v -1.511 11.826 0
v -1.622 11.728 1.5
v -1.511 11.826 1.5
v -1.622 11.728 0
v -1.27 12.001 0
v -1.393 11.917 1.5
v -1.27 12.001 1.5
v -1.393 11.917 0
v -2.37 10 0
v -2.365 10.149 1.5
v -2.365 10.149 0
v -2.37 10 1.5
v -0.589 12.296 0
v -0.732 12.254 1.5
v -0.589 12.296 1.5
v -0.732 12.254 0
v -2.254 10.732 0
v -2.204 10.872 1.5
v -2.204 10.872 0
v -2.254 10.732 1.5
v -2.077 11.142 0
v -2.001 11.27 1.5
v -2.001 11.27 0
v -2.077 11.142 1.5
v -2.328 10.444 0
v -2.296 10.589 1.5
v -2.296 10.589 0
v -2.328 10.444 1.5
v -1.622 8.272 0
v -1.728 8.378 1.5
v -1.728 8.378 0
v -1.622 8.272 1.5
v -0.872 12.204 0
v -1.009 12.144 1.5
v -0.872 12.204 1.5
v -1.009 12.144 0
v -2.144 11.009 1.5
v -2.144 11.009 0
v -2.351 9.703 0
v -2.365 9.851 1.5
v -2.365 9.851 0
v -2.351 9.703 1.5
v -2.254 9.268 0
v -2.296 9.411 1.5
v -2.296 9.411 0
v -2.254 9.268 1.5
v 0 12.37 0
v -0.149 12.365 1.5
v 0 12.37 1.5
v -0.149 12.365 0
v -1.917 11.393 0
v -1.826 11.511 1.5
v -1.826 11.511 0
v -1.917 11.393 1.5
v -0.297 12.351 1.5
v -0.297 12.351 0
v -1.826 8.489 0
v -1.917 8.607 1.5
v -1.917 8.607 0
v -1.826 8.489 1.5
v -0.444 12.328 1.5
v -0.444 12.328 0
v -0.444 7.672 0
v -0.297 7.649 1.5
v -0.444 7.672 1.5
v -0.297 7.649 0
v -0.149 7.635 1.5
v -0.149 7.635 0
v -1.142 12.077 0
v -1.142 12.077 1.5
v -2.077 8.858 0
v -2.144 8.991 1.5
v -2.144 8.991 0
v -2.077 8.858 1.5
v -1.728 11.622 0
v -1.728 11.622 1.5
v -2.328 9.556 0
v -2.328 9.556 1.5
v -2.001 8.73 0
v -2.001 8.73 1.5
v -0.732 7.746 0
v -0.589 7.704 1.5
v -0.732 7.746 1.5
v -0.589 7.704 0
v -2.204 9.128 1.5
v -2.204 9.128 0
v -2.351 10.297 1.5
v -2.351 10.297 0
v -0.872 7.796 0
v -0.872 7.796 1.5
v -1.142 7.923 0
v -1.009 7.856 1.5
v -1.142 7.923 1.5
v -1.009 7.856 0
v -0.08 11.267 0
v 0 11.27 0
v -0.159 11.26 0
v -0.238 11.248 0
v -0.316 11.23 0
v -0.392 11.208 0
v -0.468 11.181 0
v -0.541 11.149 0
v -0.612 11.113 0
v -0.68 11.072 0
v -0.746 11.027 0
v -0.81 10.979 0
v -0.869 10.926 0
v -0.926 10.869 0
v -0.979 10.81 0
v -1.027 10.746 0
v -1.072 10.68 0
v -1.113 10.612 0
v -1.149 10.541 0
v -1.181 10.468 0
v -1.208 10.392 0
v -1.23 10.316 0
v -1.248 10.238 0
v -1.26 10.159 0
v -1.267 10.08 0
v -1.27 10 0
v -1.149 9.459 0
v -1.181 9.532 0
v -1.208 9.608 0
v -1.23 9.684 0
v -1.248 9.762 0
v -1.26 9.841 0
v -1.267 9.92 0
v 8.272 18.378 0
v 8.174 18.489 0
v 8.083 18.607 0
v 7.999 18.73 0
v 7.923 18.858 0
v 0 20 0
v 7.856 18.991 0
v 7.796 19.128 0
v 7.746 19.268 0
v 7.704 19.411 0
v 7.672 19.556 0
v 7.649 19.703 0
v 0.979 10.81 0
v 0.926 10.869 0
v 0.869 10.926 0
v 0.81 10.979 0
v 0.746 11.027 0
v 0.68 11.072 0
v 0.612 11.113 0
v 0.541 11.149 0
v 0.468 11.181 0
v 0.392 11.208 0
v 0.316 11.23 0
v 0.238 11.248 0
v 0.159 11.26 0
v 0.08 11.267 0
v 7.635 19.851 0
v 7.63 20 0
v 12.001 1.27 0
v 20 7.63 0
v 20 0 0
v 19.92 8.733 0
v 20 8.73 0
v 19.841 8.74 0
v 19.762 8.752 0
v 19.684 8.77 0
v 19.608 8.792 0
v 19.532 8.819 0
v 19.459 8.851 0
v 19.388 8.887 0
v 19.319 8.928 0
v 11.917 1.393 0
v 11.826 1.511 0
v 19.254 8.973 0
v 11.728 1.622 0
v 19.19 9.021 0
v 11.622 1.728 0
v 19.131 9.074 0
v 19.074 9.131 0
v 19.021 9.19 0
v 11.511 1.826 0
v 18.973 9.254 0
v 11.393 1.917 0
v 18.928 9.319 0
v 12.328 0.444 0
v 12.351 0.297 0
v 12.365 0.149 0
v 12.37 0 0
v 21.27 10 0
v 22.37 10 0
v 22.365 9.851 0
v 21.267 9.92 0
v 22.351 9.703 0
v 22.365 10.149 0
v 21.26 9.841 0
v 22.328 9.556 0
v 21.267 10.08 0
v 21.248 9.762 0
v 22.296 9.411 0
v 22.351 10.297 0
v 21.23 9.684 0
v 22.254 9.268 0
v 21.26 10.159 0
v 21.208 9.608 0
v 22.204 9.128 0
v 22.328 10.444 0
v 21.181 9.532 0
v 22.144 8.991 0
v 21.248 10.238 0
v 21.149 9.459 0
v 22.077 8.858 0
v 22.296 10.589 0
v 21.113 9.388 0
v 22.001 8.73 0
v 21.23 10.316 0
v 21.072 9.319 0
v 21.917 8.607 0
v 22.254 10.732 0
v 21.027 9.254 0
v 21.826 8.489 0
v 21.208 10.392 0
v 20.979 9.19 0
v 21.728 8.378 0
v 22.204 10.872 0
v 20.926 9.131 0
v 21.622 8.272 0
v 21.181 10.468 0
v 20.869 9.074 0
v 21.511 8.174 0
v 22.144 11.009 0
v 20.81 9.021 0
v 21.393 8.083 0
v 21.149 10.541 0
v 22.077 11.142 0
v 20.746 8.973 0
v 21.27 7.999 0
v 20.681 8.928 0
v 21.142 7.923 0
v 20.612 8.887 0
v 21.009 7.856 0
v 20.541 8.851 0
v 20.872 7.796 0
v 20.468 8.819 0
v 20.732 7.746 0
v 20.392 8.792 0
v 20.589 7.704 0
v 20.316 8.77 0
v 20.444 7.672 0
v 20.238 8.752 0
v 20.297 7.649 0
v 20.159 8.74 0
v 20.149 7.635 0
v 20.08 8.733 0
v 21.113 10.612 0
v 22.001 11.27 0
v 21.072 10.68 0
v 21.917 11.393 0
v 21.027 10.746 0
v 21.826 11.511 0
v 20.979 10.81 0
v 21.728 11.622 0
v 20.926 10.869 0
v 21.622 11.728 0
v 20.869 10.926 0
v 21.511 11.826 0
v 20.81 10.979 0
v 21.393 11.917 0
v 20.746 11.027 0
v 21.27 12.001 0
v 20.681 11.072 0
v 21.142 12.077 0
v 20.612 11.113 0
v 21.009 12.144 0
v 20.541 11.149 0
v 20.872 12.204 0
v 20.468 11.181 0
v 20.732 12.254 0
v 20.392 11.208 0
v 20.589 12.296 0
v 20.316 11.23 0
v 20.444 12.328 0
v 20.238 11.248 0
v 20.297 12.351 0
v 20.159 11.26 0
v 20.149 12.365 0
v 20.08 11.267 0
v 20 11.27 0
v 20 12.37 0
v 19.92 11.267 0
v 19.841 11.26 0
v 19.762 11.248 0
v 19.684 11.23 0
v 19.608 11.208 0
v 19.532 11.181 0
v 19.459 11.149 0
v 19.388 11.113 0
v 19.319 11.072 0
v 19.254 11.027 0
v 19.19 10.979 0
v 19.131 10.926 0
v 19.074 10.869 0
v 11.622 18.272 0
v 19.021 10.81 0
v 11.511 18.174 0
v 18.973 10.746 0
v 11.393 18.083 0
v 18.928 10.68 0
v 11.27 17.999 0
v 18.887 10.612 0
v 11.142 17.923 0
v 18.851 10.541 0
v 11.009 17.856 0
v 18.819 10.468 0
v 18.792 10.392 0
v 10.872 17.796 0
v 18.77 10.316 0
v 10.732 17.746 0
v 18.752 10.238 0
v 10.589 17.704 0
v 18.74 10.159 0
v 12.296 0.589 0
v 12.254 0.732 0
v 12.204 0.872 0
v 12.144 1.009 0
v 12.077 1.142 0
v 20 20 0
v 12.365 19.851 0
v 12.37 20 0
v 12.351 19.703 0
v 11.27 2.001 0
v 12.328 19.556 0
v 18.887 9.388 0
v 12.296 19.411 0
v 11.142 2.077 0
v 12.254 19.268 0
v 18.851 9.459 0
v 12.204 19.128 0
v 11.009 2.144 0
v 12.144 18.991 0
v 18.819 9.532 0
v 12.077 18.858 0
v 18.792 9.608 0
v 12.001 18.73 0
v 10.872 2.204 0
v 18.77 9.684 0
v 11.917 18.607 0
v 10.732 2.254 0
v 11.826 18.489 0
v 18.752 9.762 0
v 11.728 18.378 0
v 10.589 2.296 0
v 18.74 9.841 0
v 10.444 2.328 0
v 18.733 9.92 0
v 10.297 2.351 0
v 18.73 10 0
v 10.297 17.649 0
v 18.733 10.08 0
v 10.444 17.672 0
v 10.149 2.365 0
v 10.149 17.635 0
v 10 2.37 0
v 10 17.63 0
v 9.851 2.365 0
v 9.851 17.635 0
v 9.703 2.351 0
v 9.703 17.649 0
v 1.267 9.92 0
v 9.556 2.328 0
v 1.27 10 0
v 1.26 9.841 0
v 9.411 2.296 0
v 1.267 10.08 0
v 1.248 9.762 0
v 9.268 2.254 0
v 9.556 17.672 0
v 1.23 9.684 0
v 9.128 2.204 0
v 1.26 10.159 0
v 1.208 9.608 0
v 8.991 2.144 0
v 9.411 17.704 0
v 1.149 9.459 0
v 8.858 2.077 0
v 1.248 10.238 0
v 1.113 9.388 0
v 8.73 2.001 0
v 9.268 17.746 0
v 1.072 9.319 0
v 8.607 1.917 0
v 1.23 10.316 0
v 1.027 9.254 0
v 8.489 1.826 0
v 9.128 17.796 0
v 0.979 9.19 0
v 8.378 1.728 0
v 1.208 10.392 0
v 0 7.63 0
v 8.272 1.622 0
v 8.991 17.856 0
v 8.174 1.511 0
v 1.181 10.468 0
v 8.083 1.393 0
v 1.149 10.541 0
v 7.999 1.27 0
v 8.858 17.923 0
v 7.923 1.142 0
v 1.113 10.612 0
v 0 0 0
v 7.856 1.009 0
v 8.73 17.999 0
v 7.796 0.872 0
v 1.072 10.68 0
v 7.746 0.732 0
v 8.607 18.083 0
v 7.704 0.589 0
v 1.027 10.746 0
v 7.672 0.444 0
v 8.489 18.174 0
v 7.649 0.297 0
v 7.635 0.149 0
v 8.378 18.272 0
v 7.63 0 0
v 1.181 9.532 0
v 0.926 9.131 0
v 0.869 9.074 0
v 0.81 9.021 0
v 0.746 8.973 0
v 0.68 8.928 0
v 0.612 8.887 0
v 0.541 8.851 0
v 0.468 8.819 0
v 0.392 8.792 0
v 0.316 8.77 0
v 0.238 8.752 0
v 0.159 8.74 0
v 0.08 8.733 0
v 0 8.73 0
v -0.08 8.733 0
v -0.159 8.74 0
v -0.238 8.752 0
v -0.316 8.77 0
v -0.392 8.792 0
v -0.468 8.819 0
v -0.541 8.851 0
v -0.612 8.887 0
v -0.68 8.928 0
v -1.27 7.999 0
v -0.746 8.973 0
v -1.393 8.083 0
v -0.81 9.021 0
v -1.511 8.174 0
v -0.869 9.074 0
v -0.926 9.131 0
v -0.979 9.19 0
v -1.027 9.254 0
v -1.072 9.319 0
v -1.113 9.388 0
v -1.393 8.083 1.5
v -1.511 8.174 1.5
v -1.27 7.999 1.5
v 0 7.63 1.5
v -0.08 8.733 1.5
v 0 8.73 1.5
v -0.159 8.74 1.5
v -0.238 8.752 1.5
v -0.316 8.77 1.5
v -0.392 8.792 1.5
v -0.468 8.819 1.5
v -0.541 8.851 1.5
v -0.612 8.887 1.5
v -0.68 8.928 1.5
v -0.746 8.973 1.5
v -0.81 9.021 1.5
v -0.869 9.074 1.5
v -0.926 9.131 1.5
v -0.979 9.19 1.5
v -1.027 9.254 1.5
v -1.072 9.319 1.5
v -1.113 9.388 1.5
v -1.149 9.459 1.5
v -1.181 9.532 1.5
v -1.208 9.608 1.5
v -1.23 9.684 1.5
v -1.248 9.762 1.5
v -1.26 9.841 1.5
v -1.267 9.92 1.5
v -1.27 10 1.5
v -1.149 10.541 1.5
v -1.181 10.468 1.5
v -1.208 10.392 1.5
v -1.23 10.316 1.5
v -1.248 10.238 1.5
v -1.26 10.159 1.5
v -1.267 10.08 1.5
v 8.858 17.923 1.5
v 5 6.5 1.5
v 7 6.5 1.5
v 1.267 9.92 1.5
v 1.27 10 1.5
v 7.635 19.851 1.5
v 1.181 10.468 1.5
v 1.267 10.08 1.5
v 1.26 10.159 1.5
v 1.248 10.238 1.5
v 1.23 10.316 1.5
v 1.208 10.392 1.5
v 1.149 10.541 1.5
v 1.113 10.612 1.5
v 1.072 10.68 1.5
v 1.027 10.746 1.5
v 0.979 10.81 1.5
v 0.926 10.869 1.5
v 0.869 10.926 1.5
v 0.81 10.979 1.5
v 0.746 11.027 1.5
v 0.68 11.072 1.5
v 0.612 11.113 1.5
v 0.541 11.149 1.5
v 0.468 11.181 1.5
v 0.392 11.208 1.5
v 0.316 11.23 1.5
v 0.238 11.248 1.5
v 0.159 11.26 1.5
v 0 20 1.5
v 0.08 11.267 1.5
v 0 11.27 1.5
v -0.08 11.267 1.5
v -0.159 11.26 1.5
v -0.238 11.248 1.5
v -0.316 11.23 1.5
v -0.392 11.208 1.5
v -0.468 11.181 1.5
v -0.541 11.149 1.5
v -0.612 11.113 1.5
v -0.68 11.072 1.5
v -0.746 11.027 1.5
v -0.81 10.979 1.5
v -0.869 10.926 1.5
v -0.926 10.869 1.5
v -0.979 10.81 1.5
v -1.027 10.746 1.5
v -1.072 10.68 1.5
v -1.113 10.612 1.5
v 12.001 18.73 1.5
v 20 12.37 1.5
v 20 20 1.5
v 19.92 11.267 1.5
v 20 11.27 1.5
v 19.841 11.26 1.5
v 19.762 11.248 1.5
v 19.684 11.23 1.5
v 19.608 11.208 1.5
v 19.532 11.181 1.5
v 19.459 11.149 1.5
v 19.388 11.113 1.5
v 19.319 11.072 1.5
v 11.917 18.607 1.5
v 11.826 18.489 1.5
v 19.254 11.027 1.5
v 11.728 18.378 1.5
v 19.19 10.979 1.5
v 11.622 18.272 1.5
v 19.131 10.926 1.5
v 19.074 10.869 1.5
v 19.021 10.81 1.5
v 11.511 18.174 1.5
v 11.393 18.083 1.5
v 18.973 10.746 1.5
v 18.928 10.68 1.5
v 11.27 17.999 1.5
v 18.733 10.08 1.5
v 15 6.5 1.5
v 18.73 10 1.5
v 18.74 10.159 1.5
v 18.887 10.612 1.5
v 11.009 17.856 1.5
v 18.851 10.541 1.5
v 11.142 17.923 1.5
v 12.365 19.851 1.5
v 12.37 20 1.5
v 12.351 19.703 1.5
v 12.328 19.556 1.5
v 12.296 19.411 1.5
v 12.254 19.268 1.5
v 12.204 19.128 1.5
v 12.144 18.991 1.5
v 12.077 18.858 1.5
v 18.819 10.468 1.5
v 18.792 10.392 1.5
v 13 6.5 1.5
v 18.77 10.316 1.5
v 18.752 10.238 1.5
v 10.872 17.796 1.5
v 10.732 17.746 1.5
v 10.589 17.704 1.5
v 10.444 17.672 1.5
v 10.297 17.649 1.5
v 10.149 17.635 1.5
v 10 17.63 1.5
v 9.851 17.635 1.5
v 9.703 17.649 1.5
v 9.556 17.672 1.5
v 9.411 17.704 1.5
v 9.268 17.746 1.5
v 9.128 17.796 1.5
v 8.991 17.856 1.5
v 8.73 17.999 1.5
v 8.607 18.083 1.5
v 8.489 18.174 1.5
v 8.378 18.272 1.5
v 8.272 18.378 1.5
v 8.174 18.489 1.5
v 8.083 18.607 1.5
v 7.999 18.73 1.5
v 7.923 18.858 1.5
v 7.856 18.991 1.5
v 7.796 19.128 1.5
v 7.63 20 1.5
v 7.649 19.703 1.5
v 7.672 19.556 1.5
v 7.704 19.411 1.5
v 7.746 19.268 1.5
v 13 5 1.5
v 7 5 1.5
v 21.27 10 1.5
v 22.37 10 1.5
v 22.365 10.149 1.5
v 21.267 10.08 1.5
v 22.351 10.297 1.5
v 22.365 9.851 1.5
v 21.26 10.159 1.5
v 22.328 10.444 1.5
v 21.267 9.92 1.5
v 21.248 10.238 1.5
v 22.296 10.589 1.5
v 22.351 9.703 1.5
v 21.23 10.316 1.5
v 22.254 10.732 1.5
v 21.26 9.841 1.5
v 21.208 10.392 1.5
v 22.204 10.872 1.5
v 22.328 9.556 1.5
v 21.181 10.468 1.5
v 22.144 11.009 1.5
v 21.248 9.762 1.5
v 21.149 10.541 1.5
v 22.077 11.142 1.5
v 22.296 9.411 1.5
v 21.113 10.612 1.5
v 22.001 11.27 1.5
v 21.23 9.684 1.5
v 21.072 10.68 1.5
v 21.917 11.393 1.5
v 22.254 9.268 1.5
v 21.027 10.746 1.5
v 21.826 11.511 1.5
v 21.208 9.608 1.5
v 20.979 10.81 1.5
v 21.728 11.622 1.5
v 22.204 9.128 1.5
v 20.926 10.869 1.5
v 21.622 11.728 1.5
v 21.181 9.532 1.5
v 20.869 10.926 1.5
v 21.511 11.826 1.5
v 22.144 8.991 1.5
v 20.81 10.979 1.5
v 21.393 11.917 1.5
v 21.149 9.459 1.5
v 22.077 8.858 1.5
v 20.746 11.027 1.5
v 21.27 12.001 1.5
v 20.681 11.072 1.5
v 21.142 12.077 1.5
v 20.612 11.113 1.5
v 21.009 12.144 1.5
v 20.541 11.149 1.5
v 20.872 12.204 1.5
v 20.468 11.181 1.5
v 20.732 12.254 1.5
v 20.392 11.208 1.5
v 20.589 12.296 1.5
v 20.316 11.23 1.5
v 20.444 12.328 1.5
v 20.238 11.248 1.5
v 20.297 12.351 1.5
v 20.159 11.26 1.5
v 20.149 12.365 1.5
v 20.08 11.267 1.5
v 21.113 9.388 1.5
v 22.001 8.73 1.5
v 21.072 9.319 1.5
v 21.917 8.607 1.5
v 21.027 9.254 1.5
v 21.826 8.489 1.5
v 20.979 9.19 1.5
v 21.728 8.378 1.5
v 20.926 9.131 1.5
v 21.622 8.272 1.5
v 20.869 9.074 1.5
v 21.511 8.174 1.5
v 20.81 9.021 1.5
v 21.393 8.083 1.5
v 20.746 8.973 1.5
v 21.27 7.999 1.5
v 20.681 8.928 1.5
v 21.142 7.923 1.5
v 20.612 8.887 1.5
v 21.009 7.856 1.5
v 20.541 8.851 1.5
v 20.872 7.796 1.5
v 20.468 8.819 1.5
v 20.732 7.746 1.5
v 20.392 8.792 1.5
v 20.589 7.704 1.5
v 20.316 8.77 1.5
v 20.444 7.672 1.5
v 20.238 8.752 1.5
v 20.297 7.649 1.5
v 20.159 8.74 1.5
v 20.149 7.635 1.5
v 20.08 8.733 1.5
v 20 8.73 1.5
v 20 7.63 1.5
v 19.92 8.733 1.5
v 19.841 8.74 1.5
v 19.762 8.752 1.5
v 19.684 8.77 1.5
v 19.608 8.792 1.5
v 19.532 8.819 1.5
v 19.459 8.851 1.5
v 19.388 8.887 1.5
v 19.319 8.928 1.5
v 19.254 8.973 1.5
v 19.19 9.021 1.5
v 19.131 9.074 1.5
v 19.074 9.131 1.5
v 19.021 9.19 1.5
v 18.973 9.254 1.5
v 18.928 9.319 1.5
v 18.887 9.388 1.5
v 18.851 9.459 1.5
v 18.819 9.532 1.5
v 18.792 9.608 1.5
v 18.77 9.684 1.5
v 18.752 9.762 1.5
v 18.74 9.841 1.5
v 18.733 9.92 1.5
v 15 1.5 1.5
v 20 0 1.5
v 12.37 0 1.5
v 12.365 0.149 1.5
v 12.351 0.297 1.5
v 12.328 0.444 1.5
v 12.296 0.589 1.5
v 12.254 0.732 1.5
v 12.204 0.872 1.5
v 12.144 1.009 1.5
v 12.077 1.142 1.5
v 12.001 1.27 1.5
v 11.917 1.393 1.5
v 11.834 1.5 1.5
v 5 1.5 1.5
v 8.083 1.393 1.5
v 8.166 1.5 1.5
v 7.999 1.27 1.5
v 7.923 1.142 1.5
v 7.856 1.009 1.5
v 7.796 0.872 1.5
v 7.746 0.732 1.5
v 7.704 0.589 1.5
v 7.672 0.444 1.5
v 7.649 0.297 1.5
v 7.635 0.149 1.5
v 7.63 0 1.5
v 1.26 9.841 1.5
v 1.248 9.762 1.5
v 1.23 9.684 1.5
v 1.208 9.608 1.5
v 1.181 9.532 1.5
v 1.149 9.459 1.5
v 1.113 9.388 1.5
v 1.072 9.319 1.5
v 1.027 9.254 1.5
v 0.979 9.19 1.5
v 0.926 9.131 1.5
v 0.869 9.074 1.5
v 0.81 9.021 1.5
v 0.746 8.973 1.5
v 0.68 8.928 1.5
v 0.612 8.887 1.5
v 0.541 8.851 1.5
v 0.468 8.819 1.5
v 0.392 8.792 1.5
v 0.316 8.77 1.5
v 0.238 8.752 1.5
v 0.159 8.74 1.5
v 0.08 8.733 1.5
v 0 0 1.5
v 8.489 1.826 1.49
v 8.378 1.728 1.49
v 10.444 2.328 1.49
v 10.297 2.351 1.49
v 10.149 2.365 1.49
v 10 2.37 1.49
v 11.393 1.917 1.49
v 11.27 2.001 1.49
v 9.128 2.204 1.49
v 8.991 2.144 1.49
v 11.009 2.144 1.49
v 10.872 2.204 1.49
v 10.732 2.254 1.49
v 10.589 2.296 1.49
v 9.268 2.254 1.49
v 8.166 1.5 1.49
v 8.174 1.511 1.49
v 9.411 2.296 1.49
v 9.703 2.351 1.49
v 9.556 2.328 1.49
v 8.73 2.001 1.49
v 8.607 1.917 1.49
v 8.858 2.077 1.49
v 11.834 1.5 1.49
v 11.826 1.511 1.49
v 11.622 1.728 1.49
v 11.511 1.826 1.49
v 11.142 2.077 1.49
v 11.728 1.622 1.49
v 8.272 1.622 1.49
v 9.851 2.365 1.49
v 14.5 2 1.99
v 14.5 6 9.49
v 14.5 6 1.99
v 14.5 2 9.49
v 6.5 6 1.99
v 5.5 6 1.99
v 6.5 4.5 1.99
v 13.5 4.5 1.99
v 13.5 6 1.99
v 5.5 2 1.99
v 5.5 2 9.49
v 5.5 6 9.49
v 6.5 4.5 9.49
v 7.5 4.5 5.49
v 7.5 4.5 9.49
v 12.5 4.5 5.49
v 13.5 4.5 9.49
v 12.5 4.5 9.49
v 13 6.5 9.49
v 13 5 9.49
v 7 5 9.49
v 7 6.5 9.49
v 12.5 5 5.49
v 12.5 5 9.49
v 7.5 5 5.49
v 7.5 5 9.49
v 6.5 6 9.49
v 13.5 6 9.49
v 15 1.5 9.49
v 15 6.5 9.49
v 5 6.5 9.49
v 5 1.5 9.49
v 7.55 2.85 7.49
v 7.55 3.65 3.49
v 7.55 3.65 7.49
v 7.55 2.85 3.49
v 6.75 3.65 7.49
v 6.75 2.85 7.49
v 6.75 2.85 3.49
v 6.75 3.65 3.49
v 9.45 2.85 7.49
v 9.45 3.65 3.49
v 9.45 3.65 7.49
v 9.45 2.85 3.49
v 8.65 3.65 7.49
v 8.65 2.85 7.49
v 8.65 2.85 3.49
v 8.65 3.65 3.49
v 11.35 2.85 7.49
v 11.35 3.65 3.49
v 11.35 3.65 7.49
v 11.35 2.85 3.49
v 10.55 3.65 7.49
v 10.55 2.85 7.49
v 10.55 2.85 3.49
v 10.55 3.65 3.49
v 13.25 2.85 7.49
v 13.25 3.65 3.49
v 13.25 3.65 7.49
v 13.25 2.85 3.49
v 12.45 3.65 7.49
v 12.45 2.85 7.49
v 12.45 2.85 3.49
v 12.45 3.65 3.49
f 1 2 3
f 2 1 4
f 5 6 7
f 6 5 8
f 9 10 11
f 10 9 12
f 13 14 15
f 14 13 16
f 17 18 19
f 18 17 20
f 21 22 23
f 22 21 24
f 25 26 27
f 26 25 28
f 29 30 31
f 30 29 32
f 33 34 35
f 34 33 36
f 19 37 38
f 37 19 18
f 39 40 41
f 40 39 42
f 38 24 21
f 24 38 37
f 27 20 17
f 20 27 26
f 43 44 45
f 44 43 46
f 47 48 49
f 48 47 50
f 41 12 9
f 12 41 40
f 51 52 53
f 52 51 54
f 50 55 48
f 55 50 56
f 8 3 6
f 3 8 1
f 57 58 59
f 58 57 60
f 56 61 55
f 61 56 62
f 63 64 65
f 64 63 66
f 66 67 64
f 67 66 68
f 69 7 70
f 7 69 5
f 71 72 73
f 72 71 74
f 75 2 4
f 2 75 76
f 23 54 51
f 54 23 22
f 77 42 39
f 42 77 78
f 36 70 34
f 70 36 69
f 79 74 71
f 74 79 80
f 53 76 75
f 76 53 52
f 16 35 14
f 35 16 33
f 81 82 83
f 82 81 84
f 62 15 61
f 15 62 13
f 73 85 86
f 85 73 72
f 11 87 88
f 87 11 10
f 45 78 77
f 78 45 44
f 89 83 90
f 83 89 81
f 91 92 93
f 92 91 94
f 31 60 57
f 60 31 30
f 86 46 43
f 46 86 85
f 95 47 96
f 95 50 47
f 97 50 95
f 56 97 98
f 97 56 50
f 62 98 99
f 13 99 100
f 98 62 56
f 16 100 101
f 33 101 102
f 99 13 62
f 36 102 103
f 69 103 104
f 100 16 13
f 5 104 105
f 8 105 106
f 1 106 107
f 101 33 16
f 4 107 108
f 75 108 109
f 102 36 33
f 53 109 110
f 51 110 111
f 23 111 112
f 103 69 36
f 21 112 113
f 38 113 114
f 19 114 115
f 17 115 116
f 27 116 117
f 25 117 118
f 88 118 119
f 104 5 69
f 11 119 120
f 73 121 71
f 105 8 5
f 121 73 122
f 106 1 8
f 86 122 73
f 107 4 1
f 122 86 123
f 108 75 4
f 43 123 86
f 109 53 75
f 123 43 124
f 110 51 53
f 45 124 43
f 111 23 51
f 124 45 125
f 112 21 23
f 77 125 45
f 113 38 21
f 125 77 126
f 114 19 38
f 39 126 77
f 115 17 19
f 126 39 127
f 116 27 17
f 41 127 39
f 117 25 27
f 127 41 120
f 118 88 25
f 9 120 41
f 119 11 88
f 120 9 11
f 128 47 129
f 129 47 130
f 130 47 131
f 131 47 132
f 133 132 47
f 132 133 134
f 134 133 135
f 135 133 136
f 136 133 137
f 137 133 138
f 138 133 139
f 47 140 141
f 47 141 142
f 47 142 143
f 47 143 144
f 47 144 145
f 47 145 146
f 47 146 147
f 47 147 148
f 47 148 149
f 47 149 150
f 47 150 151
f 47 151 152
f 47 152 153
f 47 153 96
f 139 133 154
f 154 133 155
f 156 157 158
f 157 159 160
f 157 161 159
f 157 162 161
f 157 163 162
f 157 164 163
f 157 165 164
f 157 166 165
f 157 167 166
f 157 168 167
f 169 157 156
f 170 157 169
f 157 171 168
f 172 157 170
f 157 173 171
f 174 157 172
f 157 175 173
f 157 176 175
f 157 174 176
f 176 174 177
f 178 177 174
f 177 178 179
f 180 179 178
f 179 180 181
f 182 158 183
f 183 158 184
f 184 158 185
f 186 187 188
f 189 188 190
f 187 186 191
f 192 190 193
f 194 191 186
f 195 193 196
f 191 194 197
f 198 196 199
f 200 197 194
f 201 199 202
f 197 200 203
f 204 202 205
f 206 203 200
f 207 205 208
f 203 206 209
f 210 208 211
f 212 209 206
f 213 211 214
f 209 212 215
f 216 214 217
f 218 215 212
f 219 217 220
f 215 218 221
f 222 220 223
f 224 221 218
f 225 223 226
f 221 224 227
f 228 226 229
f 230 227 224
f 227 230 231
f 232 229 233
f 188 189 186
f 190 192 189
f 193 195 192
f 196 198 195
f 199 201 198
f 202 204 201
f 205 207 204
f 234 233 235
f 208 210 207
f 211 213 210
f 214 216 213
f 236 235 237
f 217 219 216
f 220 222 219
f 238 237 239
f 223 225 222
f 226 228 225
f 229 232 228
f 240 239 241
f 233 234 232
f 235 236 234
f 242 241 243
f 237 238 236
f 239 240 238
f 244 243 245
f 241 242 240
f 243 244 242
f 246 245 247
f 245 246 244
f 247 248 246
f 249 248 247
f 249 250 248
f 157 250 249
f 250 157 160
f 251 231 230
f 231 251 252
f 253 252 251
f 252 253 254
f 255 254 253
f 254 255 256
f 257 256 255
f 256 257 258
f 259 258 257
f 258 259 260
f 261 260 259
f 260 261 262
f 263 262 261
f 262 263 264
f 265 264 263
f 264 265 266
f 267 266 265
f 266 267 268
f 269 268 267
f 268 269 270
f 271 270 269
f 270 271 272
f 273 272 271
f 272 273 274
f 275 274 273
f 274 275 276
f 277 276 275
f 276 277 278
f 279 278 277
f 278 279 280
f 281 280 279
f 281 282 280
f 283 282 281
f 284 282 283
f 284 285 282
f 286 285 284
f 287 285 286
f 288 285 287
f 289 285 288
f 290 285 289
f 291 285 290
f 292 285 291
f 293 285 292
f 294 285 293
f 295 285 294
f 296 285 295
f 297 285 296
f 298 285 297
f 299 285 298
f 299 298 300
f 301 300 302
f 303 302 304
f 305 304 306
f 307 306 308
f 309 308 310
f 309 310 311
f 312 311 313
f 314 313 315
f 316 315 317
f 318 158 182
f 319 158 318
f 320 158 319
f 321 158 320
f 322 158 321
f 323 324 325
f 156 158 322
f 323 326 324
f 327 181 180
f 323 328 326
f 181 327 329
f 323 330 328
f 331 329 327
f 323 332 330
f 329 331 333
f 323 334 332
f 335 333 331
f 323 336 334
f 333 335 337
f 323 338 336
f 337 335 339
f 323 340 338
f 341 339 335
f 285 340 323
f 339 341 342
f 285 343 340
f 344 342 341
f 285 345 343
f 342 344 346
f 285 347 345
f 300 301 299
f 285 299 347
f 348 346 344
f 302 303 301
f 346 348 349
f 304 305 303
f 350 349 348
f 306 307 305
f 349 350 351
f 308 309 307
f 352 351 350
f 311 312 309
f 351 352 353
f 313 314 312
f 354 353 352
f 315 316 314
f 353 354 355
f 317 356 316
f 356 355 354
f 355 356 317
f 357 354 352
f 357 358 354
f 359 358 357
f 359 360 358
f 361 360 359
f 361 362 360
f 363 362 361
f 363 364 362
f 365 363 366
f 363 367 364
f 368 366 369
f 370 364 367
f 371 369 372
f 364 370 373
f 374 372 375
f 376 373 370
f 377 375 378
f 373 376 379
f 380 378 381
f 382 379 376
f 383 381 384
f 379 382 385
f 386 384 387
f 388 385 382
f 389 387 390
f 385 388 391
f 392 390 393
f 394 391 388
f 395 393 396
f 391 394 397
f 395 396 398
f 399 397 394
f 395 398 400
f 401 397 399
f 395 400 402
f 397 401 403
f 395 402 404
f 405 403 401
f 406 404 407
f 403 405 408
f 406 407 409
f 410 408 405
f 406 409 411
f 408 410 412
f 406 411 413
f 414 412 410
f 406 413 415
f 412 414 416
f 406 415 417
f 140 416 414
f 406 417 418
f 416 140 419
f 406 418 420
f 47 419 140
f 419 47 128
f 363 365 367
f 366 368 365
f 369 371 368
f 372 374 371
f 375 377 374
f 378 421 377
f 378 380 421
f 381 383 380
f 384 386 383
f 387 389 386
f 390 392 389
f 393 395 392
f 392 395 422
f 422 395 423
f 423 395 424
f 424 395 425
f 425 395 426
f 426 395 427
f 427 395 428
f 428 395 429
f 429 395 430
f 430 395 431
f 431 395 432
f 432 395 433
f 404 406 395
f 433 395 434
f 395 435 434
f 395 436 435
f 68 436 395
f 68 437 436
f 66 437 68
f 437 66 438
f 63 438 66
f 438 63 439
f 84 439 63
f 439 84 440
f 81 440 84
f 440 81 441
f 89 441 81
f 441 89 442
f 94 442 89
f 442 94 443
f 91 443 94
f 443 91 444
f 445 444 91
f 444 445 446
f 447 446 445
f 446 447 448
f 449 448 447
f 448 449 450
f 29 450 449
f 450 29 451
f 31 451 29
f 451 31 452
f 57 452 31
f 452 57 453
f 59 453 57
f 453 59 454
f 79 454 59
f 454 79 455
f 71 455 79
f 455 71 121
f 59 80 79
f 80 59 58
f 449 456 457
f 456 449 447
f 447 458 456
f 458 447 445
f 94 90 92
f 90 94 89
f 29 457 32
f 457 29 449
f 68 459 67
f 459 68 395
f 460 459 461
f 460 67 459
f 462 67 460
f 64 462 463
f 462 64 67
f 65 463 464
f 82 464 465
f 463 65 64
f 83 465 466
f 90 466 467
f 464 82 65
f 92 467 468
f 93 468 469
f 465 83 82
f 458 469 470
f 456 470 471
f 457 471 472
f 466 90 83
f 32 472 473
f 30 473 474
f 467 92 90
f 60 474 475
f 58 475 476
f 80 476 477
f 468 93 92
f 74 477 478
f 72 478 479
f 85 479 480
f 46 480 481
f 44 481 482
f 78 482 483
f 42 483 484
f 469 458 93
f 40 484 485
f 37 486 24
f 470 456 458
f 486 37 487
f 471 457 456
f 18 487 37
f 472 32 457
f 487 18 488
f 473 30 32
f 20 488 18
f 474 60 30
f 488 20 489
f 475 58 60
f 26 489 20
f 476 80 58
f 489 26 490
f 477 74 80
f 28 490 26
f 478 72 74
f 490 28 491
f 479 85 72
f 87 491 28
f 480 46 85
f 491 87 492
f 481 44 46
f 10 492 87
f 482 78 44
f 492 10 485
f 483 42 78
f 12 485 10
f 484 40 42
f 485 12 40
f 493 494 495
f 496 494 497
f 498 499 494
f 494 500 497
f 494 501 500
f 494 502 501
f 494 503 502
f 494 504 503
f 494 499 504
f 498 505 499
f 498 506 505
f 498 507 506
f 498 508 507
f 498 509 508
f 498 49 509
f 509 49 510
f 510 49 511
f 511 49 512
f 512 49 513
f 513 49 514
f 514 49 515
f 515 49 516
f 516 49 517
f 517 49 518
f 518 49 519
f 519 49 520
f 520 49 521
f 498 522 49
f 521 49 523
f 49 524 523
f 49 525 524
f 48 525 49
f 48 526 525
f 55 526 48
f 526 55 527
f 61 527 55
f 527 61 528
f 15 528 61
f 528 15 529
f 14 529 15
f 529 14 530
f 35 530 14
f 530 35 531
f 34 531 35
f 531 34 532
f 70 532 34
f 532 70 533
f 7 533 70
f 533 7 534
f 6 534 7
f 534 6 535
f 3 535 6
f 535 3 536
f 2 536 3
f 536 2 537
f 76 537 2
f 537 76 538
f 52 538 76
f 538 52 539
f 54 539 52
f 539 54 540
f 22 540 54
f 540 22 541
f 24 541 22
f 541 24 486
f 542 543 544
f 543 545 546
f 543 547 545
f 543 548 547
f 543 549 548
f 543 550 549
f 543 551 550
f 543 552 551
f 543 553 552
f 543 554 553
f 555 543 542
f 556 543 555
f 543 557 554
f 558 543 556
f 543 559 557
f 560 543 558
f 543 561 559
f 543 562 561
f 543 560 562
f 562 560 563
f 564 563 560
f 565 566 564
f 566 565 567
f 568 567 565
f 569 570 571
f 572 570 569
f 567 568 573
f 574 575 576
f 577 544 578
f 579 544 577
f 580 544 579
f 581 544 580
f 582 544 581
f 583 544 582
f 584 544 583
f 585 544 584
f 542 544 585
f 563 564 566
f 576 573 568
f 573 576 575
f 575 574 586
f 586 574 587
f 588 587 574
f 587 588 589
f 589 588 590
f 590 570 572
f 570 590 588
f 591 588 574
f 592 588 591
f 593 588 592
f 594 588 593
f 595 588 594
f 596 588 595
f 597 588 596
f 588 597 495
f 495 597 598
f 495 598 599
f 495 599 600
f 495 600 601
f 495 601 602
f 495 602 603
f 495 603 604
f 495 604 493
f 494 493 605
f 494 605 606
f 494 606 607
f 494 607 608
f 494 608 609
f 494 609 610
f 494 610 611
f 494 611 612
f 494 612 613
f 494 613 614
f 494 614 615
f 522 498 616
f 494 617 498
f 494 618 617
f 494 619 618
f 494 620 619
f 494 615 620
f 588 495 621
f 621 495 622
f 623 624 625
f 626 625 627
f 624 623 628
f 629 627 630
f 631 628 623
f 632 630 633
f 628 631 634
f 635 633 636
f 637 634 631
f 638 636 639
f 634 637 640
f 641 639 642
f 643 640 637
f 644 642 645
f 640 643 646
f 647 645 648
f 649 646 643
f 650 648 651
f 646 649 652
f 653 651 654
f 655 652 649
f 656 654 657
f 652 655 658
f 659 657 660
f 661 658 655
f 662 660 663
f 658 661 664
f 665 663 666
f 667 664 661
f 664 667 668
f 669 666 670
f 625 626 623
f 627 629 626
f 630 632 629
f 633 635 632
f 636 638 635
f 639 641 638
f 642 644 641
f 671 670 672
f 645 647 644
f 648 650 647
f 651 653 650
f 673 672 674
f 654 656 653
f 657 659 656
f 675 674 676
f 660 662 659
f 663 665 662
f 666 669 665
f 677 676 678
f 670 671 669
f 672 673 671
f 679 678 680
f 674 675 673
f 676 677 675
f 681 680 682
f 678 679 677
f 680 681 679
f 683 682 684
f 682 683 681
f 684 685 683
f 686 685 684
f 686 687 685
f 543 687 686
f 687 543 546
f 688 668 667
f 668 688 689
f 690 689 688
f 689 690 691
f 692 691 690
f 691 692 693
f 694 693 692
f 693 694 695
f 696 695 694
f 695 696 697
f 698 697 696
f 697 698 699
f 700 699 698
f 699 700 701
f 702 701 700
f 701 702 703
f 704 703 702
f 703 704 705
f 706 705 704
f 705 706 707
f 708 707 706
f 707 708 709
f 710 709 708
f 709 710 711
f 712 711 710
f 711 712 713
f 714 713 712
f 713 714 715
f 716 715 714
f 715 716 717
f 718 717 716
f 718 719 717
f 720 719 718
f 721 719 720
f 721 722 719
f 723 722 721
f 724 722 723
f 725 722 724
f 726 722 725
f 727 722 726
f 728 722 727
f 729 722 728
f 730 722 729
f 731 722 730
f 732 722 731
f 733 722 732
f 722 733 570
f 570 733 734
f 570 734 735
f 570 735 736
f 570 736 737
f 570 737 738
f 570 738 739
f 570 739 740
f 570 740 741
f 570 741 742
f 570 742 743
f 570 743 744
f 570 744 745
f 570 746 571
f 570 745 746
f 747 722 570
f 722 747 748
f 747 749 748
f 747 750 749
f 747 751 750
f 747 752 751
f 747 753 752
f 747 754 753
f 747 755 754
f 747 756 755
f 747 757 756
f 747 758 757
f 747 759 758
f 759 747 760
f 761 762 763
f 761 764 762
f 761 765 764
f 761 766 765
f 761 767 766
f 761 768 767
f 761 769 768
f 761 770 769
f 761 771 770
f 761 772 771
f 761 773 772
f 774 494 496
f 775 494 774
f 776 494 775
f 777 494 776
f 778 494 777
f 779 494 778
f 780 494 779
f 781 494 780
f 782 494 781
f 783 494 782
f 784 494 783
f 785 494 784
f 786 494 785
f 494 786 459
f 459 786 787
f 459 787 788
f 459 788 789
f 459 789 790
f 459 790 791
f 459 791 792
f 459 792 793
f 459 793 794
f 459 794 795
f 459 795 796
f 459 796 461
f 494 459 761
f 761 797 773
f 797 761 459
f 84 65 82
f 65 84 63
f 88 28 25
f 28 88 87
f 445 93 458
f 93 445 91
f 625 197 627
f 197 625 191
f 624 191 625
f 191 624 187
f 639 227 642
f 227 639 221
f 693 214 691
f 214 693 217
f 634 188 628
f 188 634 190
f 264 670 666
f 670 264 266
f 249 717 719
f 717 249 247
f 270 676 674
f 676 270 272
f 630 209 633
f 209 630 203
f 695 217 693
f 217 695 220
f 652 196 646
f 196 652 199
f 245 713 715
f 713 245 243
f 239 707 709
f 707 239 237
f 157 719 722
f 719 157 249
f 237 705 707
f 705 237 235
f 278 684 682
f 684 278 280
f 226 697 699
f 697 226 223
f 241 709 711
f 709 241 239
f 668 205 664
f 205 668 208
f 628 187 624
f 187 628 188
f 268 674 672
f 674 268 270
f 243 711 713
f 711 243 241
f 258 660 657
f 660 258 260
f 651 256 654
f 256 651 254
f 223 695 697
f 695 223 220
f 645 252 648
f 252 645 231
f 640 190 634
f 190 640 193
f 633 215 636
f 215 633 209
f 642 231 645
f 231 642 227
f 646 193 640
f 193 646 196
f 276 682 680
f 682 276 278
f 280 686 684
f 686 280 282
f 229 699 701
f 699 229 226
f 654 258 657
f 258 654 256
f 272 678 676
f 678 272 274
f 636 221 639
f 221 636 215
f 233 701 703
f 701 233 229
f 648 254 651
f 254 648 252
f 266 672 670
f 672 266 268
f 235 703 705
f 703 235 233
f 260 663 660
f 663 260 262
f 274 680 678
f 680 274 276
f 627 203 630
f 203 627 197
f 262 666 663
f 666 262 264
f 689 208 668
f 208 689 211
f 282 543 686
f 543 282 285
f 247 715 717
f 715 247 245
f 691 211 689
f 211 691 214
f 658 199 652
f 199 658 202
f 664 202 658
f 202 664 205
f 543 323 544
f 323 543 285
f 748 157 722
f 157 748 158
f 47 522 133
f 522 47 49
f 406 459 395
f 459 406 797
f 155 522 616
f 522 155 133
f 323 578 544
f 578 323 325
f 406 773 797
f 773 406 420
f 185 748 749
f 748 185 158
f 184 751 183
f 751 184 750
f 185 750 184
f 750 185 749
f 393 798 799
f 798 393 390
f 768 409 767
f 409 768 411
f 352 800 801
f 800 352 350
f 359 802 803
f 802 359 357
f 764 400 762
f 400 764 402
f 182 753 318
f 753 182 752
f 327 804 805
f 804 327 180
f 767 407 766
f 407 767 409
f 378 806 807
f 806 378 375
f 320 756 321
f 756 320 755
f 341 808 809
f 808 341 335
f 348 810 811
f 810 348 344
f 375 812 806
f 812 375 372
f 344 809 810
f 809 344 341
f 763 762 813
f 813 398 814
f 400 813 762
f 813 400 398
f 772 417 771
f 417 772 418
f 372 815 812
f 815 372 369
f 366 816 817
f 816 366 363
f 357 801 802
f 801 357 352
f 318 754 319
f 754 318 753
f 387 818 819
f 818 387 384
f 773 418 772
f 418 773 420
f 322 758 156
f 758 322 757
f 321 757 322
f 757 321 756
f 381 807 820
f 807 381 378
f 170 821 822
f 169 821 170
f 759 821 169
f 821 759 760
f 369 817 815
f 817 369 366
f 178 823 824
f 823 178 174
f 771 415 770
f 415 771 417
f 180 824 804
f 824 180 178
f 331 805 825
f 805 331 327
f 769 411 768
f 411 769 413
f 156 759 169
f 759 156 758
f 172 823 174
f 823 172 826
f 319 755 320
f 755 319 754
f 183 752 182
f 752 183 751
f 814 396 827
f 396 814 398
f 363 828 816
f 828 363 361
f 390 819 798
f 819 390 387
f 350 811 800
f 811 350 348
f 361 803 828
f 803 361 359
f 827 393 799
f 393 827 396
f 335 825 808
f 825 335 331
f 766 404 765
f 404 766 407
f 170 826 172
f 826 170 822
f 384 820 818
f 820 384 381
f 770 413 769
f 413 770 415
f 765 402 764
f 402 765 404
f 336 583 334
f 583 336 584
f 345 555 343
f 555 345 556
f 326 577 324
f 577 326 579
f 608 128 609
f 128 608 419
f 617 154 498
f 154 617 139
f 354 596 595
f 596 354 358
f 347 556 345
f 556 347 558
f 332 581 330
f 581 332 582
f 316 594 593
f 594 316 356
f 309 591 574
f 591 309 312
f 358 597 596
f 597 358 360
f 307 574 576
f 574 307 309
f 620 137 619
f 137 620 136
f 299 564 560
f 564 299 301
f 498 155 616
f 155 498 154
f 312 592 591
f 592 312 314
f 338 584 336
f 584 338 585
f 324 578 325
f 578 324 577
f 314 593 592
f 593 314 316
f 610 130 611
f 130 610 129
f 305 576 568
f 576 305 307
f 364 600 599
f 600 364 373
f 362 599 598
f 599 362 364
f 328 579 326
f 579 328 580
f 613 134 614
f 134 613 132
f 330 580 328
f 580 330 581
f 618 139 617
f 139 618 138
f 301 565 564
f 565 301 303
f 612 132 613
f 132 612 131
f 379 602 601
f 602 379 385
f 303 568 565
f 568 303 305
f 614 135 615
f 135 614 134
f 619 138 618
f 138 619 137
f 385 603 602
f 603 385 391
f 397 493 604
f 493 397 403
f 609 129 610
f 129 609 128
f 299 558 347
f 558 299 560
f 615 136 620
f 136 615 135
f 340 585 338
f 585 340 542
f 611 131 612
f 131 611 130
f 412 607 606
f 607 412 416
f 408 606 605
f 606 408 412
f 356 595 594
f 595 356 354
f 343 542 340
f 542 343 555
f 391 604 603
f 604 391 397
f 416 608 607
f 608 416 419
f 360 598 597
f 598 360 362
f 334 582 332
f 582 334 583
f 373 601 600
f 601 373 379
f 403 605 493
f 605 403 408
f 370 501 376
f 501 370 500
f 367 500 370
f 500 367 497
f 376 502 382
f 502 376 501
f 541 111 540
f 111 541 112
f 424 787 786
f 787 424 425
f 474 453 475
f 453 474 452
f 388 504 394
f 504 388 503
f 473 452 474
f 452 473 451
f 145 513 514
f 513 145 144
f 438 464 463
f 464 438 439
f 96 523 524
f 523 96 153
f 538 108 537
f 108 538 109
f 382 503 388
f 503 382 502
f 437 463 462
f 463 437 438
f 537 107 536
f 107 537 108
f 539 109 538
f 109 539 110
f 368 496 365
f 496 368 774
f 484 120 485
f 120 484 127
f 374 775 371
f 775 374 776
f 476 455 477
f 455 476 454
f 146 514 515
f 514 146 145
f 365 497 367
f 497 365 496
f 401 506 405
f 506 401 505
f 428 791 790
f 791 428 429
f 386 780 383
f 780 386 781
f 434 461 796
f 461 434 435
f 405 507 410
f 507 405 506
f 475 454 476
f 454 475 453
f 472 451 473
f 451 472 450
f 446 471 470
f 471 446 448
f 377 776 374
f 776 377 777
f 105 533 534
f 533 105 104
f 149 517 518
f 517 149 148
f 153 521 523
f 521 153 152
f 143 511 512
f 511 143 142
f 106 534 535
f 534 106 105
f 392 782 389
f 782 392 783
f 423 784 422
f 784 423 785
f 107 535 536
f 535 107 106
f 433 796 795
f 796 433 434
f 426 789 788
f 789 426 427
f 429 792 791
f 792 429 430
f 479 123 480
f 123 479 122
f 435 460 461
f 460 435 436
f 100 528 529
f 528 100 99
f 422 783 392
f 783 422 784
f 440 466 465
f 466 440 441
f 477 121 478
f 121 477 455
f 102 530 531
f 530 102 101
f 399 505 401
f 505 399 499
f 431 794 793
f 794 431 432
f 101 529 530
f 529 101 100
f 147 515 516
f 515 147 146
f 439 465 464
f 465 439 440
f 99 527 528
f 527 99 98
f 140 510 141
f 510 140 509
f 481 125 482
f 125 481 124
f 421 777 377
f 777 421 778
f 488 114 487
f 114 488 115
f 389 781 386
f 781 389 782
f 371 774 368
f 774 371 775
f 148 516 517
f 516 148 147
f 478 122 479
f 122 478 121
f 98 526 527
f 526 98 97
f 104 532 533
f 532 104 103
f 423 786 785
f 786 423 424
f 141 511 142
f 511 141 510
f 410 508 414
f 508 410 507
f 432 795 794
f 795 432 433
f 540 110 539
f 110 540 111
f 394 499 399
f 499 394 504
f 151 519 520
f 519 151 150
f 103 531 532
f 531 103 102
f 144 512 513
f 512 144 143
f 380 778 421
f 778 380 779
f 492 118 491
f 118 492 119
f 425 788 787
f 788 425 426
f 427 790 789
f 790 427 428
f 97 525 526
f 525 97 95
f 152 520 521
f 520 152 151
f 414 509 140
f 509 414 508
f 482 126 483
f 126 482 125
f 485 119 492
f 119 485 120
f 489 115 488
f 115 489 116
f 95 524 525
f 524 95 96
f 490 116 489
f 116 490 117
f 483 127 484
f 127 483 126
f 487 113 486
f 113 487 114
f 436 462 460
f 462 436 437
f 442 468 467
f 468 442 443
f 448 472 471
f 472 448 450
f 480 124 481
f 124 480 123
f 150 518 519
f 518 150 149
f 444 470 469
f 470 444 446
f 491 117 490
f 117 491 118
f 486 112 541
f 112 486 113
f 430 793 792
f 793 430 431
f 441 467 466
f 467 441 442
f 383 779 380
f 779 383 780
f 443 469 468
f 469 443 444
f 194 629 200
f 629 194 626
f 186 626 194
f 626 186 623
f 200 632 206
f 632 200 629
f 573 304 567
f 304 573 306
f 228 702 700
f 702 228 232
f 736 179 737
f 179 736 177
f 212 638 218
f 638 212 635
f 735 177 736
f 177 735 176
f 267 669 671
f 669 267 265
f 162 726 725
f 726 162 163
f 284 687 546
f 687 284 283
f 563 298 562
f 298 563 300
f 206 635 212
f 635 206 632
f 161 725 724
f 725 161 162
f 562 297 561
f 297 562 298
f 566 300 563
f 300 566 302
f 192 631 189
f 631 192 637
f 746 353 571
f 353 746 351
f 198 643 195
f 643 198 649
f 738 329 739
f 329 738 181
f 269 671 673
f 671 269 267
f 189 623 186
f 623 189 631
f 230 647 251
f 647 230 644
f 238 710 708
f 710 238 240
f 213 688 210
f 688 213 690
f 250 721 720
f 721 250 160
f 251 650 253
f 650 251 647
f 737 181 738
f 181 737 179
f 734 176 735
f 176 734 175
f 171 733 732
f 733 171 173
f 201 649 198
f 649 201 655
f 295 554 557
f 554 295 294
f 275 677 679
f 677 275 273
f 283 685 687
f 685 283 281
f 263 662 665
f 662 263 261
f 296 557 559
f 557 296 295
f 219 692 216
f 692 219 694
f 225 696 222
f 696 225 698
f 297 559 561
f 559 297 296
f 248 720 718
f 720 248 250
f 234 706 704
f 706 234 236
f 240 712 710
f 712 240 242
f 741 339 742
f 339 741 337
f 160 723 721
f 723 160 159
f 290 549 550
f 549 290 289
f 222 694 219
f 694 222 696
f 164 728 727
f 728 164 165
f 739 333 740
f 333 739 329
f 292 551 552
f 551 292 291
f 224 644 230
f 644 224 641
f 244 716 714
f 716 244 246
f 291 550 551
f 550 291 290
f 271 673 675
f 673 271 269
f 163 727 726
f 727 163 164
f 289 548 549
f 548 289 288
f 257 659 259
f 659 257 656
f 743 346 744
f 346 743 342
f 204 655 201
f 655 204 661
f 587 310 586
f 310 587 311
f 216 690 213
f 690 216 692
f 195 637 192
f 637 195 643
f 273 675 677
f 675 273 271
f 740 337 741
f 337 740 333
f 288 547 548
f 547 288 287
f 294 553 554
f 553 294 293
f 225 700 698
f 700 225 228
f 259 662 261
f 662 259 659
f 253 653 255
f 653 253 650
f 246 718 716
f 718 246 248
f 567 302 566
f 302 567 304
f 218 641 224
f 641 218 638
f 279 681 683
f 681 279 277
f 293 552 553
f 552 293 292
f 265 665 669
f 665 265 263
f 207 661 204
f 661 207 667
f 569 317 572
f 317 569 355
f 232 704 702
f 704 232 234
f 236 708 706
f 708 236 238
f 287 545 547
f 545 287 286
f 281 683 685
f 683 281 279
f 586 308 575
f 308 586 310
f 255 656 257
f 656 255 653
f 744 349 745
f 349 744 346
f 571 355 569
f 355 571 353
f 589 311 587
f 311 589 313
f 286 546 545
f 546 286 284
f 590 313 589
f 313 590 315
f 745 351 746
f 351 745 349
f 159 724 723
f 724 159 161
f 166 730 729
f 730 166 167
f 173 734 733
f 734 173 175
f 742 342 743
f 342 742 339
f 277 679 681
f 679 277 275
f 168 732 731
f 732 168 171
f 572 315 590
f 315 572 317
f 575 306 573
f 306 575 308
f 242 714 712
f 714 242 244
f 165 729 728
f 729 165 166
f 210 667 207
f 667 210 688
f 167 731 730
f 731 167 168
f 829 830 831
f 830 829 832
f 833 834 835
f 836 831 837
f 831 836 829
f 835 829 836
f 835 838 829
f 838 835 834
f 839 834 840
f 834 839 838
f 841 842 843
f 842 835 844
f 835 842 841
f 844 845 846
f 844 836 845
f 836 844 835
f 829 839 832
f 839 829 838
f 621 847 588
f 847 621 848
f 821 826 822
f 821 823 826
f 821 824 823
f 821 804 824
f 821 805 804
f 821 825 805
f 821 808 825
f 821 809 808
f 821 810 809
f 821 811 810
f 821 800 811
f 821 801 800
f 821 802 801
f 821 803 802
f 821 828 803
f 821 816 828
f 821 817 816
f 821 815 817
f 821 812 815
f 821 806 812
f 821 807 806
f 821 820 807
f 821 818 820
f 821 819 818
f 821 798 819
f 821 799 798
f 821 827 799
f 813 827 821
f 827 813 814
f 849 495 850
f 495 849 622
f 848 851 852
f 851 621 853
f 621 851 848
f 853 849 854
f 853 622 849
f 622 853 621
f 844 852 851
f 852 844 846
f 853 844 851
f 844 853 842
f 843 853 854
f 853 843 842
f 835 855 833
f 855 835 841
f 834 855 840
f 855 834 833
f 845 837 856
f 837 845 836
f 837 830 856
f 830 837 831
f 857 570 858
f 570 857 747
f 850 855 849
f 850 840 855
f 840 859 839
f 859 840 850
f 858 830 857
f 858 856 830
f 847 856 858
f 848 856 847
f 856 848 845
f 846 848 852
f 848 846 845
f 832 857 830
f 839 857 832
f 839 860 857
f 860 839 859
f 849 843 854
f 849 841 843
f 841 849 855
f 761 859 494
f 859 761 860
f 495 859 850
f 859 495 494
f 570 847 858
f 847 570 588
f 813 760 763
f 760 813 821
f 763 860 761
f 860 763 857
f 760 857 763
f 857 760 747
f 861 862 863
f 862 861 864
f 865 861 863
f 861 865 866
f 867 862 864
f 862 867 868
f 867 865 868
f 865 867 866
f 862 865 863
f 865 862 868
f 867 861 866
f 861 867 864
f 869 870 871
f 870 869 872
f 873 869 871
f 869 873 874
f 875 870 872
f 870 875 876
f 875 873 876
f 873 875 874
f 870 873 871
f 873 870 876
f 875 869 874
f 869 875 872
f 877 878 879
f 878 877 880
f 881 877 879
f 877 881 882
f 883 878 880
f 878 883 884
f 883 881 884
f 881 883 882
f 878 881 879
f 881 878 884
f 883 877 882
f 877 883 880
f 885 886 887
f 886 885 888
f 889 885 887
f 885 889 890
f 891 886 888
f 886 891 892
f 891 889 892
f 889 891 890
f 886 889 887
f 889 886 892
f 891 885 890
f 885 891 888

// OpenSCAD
// Seeed Studio BasePlate generator

sizeX = 1;
sizeY = 1;

sideLength = 20; // in mm
PCBheight = 1.5;

holeDiameter = 2.54;
holePadding = 1;
punchSize = holeDiameter + holePadding*2 + 0.2;

module GrovePlug( posX = sideLength*0.25, posY = 1.5 ){
    
    plugWall = 0.5;
    plugW = 10;
    plugD = 5;
    plugH = 8;
    
    plugCutOutW = 6;
    plugCutOutD = 1.5;
    
    pinSize = 0.8;
    pinHeight = 4;
    pinDist = 1.9;

    translate( [posX, posY, PCBheight - 0.01]) {
        color("white"){
            
            difference(){
                cube( [plugW,plugD,plugH] );
            
                union(){
                    
                    translate( [plugWall,plugWall,plugWall] ) cube( [plugW-plugWall*2,plugD-plugWall*2 - plugCutOutD,plugH] );
                    
                    translate( [(plugW-plugCutOutW)/2,plugD-plugCutOutD,0] ) cube( [ plugCutOutW, plugCutOutD*1.1, plugH*1.1 ] ); 
                    translate( [(plugW-plugCutOutW)/2 + plugWall,plugD-plugCutOutD-plugWall*2,plugH/2] ) cube( [ plugCutOutW - plugWall*2, plugCutOutD*1.1, plugH*1.1 ] ); 
                    
                    
                    tinyCutOut = (plugW-plugCutOutW)/2-plugWall*2;
                    
                    translate( [plugWall,plugWall,plugWall] ) cube( [tinyCutOut,plugD-plugWall*2,plugH] );
                    translate( [plugW-plugWall-tinyCutOut,plugWall,plugWall] ) cube( [tinyCutOut,plugD-plugWall*2,plugH] );
                    
                }
            }
        }
        
        color("#CCC"){
            
            pinShiftX = ( plugW - pinDist*3 ) / 2;
            
            translate( [pinShiftX,plugD/2 - plugCutOutD/2,pinHeight/2+PCBheight+plugWall] ){
                
                for( i = [0:3] ){
                    
                    translate( [i*pinDist,0,0] ) cube( [pinSize,pinSize,pinHeight], center = true );
                }
            }
            
        }
    }
}

module Hole( n = 1, is_adding = false ){
    
    
    if( is_adding == true ){
        
        if( n % 2 == 0 ){
            cylinder( h = PCBheight, d = punchSize, $fn=100, center = true );
            
        }
    }else{
    
        if( n % 2 == 0 ){
            cylinder( h = PCBheight*2, d = holeDiameter, $fn=100, center = true );
            
        }else{
            cylinder( h = PCBheight*2, d = punchSize, $fn=100, center = true );
        }
    }
}

module SeeedBasePlate( x = 1, y = 1 ){
    
    color("#5d9bc5"){
        
        difference(){
            union(){
               
                // base plate
                cube( [ x*sideLength, y*sideLength, PCBheight ], center = false );
                
                // add padding Elments
                for( col = [ 1 : x ] ){
                                        
                        translate( [ col * sideLength - sideLength/2,  0, PCBheight/2 ] ) Hole( n = col, is_adding = true );
                        translate( [ col * sideLength - sideLength/2,  sideLength * y, PCBheight/2 ] ) Hole( n = col, is_adding = true );
                                            
                }
                for( row = [ 1 : y ] ){
                        translate( [ 0,  row * sideLength - sideLength/2, PCBheight/2 ] ) Hole( n = row+1, is_adding = true  );
                        translate( [ x * sideLength,  sideLength * row - sideLength/2, PCBheight/2 ] )  Hole( n = row+1, is_adding = true  );

                }
            }
            
            // cutouts
            union(){
                
                // holes in additional elements
                for( col = [ 1 : x ] ){
                        translate( [ col * sideLength - sideLength/2,  0, PCBheight/2 ] ) Hole( n = col );
                        translate( [ col * sideLength - sideLength/2,  sideLength * y, PCBheight/2 ] )  Hole( n = col );

                }
                for( row = [ 1 : y ] ){
                        translate( [ 0,  row * sideLength - sideLength/2, PCBheight/2 ] ) Hole( n = row+1 );
                        translate( [ x * sideLength,  sideLength * row - sideLength/2, PCBheight/2 ] )  Hole( n = row+1 );

                }
                
            }
        }
    }
}




SeeedBasePlate( x = sizeX, y = sizeY );
GrovePlug();
